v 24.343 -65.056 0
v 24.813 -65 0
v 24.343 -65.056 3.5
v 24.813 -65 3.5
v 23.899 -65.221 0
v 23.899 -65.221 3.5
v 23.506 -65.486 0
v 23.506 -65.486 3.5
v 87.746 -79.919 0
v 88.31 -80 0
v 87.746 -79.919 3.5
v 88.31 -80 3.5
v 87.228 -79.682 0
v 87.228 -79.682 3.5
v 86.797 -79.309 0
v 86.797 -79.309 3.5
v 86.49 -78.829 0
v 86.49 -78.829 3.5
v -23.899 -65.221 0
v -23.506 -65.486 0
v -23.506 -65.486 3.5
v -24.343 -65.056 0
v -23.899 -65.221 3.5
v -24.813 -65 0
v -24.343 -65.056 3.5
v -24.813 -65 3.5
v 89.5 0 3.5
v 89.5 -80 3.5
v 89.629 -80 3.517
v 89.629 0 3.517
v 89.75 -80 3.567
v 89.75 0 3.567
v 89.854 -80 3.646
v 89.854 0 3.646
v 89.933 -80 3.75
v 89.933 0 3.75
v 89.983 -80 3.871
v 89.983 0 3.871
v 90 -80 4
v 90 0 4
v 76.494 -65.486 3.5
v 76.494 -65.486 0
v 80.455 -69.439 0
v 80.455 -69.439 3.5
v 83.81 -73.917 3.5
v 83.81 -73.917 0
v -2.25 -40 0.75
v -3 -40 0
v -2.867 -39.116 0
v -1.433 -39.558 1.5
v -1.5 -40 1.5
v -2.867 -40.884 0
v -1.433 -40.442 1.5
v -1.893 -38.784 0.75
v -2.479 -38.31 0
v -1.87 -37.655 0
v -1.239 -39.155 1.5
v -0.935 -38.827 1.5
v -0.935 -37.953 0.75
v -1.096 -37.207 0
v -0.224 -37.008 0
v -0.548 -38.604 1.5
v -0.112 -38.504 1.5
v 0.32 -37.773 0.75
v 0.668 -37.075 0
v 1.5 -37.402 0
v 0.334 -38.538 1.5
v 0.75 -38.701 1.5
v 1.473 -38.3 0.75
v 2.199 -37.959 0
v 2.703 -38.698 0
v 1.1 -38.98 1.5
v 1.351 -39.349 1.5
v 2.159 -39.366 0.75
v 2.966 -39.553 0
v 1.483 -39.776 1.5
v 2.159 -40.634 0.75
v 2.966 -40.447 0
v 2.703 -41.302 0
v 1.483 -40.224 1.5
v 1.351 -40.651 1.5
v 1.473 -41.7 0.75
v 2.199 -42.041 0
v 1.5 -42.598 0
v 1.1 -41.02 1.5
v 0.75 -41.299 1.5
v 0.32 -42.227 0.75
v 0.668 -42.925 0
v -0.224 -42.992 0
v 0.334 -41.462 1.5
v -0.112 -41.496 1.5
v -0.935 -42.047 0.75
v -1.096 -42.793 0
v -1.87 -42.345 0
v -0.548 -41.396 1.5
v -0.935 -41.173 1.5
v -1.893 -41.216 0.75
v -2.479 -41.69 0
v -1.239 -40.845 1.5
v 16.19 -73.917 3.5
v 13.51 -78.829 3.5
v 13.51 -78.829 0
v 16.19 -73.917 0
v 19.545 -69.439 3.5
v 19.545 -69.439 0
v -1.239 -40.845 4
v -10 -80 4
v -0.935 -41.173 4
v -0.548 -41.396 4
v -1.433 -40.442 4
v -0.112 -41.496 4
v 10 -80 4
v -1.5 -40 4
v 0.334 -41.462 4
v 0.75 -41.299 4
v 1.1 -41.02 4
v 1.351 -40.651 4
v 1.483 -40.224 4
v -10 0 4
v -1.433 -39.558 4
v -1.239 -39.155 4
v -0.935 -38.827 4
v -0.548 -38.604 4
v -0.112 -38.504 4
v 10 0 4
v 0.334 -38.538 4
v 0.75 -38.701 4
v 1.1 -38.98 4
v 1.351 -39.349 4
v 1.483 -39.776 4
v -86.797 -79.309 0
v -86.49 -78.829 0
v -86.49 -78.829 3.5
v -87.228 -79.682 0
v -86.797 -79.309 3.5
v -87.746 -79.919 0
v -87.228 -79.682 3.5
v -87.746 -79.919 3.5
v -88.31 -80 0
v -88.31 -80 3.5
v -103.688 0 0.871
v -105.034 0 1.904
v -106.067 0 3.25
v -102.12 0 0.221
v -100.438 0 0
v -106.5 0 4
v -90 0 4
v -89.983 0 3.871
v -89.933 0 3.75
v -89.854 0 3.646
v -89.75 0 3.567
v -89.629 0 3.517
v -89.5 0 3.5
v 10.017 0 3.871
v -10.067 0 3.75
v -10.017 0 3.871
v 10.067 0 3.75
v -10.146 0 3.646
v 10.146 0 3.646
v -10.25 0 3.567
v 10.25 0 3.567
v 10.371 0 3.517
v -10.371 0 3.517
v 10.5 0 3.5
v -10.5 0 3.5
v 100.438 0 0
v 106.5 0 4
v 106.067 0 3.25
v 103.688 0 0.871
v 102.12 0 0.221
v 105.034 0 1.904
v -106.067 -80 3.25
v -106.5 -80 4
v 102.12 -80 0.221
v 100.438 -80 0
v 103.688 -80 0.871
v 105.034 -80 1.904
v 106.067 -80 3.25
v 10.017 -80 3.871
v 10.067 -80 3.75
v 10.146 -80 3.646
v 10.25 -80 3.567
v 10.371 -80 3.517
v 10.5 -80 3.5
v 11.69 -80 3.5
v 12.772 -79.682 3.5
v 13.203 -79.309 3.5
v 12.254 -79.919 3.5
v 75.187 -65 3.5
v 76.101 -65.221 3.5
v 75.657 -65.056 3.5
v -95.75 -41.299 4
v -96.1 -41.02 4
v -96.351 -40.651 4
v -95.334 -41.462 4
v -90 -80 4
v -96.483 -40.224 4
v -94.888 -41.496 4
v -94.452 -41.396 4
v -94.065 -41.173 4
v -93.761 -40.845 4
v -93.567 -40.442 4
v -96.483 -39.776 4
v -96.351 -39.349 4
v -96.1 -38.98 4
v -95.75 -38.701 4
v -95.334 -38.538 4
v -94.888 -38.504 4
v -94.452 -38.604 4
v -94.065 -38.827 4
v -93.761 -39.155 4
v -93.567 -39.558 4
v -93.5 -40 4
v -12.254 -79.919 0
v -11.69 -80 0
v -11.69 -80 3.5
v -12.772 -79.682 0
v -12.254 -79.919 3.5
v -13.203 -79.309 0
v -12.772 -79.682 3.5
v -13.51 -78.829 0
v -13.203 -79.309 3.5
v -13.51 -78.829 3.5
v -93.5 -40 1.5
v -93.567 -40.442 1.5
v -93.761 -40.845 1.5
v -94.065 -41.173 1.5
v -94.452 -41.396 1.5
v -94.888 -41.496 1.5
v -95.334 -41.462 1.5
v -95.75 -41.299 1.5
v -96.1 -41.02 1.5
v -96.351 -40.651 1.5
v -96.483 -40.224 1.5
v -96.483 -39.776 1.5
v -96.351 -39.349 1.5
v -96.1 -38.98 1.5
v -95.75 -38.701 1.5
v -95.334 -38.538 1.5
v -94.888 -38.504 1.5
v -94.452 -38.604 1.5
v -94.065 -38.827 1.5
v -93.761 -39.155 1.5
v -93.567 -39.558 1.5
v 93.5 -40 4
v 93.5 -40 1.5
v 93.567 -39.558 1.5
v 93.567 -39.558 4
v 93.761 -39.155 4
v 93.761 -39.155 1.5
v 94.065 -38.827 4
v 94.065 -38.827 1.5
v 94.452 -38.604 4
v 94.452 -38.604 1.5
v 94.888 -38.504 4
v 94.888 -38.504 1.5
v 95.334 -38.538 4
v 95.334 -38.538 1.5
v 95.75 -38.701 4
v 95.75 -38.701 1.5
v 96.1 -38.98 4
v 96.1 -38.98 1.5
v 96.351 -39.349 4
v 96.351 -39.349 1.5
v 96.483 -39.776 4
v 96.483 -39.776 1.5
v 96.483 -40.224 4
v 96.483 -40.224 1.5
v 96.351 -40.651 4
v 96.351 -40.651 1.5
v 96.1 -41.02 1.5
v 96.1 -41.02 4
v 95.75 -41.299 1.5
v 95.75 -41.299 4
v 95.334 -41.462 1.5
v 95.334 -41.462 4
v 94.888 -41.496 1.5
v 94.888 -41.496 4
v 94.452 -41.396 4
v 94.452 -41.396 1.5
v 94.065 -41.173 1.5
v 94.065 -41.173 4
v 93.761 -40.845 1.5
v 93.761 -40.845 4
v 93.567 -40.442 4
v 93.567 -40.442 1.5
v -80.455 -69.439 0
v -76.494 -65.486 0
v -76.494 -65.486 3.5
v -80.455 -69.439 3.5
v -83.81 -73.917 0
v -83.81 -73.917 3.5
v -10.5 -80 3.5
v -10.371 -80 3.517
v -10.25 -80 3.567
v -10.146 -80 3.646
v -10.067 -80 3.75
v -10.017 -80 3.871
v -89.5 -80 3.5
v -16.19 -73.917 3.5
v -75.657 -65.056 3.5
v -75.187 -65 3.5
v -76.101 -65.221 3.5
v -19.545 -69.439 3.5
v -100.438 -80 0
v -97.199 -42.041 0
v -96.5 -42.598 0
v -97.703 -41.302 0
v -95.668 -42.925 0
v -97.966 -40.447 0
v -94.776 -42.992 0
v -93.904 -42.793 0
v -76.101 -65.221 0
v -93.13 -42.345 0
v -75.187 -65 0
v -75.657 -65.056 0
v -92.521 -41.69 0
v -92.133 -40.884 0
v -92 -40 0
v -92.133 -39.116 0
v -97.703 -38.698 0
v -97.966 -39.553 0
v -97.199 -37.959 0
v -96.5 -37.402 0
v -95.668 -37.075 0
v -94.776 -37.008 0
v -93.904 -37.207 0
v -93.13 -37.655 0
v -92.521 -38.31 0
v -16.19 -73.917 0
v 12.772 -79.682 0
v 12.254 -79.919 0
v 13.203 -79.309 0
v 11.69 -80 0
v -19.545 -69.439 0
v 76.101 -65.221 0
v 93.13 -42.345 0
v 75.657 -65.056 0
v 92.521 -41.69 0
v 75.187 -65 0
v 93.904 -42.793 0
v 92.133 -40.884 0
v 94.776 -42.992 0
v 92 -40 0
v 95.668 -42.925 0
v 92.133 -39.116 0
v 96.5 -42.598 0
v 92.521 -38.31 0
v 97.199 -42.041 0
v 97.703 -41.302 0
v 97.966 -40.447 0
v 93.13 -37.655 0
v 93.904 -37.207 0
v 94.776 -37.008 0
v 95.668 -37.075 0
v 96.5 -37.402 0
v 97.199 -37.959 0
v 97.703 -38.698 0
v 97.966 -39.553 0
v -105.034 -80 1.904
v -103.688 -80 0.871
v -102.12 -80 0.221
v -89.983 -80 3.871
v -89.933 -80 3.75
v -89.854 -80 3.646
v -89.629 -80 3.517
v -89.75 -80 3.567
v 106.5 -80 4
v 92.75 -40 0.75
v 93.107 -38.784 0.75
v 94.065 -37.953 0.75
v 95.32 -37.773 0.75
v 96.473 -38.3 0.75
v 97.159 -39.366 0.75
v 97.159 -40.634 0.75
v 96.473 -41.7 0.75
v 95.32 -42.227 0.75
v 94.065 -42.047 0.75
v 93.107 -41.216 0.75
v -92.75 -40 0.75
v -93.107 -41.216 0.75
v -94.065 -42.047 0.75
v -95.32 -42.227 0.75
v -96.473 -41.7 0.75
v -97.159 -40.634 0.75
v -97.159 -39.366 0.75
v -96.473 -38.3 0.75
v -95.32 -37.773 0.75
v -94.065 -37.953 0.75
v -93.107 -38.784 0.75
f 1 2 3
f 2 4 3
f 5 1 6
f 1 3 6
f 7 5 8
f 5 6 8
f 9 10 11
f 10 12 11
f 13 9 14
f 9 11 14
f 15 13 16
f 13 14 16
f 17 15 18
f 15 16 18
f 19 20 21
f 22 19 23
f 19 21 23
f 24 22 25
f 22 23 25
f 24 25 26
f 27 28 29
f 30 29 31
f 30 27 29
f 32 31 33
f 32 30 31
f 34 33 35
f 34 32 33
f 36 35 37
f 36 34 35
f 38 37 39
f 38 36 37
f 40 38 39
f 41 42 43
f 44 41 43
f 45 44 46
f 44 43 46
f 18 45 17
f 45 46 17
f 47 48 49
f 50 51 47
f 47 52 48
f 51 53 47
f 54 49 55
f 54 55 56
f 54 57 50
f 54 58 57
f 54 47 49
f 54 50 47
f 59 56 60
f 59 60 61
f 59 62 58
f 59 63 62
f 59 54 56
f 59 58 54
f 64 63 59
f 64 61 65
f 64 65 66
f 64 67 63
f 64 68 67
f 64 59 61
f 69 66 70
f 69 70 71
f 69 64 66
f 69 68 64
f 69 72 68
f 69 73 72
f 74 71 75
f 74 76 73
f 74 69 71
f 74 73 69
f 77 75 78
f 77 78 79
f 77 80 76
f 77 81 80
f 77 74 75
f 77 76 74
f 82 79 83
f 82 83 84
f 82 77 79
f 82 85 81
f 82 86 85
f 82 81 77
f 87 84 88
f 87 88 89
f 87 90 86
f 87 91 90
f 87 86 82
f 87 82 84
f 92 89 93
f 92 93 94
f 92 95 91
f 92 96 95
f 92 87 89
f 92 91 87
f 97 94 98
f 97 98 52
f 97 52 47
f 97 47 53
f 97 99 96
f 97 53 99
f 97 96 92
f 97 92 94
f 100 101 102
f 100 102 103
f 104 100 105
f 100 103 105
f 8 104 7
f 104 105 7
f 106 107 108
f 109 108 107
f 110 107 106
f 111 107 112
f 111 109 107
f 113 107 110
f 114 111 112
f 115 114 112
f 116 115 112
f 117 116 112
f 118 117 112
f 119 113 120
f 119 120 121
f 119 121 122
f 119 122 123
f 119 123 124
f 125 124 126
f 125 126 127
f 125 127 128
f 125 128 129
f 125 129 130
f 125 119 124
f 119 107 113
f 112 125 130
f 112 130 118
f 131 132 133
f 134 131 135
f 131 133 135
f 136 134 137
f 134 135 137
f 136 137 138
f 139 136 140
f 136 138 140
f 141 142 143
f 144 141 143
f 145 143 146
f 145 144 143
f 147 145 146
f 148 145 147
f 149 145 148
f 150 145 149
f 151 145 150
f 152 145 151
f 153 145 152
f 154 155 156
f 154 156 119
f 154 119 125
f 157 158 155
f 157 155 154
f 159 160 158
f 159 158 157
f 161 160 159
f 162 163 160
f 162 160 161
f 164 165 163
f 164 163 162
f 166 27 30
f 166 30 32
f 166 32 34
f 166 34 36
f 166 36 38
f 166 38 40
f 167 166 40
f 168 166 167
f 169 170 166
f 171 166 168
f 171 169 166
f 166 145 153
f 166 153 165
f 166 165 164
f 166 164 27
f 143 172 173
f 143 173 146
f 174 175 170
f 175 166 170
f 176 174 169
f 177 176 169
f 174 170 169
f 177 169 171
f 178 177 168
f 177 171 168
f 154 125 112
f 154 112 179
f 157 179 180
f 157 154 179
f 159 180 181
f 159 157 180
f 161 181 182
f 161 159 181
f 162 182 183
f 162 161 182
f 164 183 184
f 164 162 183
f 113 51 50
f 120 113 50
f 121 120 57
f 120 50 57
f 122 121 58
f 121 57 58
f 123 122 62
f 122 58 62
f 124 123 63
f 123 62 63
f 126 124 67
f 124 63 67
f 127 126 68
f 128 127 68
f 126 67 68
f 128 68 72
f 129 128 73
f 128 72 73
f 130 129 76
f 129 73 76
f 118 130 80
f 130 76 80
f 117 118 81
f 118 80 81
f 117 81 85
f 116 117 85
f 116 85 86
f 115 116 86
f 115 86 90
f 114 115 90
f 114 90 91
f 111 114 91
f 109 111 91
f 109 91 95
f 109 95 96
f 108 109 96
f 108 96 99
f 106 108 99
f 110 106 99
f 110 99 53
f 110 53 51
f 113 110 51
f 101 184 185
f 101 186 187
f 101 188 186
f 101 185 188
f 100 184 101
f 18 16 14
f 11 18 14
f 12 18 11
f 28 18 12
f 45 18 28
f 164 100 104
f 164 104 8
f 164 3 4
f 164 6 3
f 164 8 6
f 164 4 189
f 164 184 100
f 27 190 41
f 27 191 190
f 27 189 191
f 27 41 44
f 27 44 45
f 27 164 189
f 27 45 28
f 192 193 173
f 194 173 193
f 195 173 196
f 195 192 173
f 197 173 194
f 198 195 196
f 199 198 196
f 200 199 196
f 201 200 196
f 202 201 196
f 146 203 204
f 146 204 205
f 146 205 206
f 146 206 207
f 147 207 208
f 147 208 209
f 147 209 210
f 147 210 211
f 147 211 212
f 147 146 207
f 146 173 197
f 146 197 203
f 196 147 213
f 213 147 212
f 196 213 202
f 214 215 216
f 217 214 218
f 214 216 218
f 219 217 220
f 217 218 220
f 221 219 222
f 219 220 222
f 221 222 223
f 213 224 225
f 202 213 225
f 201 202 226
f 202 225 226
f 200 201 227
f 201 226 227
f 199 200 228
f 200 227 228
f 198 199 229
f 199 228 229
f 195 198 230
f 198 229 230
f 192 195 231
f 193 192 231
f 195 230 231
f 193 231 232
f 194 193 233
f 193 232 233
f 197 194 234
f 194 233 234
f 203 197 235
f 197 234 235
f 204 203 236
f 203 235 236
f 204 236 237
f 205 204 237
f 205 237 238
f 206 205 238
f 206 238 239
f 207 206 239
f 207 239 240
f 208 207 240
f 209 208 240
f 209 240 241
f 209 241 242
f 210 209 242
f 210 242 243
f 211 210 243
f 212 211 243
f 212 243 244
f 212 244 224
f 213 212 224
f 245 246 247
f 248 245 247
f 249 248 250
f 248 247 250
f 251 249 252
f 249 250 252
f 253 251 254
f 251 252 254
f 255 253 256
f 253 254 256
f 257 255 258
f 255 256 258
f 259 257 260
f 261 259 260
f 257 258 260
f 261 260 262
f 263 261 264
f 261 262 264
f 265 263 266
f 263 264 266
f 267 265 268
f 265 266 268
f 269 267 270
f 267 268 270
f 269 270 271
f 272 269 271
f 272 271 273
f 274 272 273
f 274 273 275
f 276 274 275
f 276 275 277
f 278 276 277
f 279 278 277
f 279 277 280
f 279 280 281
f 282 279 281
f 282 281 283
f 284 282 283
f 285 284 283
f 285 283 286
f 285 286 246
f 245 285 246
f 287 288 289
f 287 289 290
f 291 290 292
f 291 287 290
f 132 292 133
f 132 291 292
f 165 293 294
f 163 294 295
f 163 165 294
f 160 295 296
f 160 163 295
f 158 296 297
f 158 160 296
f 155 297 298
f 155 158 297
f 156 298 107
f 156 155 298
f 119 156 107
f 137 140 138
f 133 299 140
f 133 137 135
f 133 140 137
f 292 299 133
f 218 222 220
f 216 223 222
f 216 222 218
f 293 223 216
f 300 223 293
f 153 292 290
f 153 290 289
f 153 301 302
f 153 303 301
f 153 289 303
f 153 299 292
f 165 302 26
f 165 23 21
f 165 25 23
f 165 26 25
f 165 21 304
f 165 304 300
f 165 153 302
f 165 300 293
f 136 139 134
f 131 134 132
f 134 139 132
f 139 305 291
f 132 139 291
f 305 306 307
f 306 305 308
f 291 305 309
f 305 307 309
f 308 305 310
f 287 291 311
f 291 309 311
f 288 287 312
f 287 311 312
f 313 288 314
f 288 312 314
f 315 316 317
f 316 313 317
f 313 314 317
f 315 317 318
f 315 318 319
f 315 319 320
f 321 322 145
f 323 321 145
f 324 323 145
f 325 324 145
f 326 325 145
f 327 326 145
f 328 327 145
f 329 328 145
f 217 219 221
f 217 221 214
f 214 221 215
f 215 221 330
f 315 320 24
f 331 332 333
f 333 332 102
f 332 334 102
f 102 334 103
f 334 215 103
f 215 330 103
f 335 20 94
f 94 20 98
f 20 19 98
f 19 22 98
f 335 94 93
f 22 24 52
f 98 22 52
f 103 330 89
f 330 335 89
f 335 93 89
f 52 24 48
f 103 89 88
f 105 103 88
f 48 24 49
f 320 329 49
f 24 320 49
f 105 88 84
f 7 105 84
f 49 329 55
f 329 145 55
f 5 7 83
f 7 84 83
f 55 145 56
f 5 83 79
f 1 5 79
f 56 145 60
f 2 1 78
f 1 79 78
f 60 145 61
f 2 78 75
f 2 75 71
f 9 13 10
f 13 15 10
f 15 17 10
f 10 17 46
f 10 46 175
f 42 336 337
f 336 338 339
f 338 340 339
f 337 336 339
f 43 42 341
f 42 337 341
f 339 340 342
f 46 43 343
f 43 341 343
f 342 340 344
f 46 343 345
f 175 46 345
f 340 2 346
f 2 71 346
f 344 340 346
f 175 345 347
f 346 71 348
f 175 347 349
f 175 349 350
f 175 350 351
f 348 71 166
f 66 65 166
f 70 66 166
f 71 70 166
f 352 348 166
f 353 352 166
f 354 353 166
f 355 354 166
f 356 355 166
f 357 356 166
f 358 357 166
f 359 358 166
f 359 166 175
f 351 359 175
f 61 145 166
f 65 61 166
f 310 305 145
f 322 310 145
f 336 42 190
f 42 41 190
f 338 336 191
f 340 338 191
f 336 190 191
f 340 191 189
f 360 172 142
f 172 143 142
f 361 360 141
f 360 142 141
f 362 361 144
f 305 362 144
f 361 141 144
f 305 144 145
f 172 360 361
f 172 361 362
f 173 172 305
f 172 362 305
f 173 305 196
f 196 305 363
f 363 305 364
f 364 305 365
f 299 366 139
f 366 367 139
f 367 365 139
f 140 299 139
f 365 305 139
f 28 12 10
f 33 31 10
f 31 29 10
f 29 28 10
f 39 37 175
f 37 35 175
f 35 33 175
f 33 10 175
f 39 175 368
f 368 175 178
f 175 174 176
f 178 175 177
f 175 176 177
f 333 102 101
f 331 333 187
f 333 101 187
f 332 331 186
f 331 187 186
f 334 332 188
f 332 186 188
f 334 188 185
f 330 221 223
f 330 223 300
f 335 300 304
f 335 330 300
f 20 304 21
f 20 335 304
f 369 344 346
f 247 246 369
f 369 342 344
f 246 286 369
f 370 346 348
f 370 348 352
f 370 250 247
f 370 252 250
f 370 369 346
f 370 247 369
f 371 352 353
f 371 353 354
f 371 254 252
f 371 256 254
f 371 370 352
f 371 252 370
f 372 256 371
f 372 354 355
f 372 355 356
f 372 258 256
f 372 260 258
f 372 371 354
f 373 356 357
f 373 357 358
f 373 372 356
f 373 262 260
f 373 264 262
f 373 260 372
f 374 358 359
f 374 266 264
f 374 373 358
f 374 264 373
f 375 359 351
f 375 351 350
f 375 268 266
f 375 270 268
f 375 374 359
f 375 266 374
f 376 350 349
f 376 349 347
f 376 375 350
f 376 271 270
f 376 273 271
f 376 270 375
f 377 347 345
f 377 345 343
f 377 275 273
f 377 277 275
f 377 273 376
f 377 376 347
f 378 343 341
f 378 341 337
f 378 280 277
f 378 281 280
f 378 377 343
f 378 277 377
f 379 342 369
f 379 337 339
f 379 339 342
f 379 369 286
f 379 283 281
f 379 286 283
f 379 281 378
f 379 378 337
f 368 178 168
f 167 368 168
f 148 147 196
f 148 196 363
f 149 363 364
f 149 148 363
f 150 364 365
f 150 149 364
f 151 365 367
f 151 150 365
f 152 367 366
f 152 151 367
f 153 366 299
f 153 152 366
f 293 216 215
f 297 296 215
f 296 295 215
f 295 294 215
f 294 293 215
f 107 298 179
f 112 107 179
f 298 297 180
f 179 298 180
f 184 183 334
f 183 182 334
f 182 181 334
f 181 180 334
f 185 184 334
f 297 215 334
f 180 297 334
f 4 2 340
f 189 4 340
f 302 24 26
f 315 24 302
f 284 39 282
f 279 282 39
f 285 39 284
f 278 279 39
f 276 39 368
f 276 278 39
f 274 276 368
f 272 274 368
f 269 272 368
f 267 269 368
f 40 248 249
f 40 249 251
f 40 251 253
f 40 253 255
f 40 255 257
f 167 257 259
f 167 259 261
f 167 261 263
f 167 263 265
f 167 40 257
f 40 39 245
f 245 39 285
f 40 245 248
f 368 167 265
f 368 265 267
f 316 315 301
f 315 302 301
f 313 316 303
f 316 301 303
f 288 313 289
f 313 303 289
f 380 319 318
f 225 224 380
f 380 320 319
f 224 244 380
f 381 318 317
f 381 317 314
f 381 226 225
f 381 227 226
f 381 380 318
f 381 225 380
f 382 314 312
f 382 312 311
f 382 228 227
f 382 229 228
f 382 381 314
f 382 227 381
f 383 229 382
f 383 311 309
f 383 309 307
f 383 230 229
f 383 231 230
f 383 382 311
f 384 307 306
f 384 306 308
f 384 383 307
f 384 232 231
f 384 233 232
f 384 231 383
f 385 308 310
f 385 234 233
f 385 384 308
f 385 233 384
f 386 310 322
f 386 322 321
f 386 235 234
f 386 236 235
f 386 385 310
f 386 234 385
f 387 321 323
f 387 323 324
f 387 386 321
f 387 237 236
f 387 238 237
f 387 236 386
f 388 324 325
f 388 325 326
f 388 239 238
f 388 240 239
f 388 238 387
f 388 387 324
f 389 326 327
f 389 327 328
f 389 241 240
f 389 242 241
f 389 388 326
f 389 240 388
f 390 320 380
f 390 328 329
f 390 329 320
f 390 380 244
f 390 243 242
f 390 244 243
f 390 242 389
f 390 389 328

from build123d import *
from OCP.BRepFilletAPI import BRepFilletAPI_MakeChamfer

# Parameters (mm, degrees)
ESQUISSE1_W             = 213
ESQUISSE1_H             = 80
BOSS_EXTRU_1_DEPTH      = 4
CHANFREIN1_SIZE         = 4
CHANFREIN1_SIZE_2       = 2.309401077
CONG_1_R                = 6.5
ESQUISSE2_R             = 1.5
ENL_V_MAT_EXTRU_1_DEPTH = 134.260084046
ENL_V_MAT_EXTRU_2_DEPTH = 134.260084046
CHANFREIN2_SIZE         = 1.5
ENL_V_MAT_EXTRU_3_DEPTH = 134.260084046
CONG_2_R                = 2


with BuildPart() as part:
    # Esquisse1 → Boss.-Extru.1 (new body)
    with BuildSketch(Plane.XY):
        with Locations((0, -40)):
            Rectangle(ESQUISSE1_W, ESQUISSE1_H)
    extrude(amount=BOSS_EXTRU_1_DEPTH)

    # Chanfrein1
    chanfrein1_edges_1 = [part.edges().sort_by_distance(p)[0] for p in [
        (-106.5, -40, 0),
    ]]
    chanfrein1_side_1 = [part.faces().sort_by_distance(p)[0] for p in [
        (-106.5, -40, 0.046188022),
    ]]
    chanfrein1_edges_2 = [part.edges().sort_by_distance(p)[0] for p in [
        (106.5, -40, 0),
    ]]
    chanfrein1_side_2 = [part.faces().sort_by_distance(p)[0] for p in [
        (106.5, -40, 0.046188022),
    ]]
    chanfrein1 = BRepFilletAPI_MakeChamfer(part.part.solid().wrapped)
    for e in chanfrein1_edges_1:
        chanfrein1.Add(CHANFREIN1_SIZE - 0.0001, CHANFREIN1_SIZE_2 - 0.0001, e.wrapped, chanfrein1_side_1[0].wrapped)
    for e in chanfrein1_edges_2:
        chanfrein1.Add(CHANFREIN1_SIZE - 0.0001, CHANFREIN1_SIZE_2 - 0.0001, e.wrapped, chanfrein1_side_2[0].wrapped)
    add(Compound.cast(chanfrein1.Shape()), mode=Mode.REPLACE)  # a hair under: the kernel refuses the full size

    # Congé1
    cong_1_edges = [part.edges().sort_by_distance(p)[0] for p in [
        (104.190698923, -40, 0),
        (-104.190698923, -40, 0),
    ]]
    fillet(cong_1_edges, radius=CONG_1_R)

    # Esquisse2 → Enlèv. mat.-Extru.1 (cut, through all)
    with BuildSketch(Plane(origin=(0, 0, 0), x_dir=(-1, 0, 0), z_dir=(0, 0, -1))):
        with Locations((-95, -40)):
            Circle(ESQUISSE2_R)
        with Locations(Location((95, -40, 0), (0, 0, 180))):
            Circle(ESQUISSE2_R)
        with Locations((0, -40)):
            Circle(ESQUISSE2_R)
    extrude(amount=-ENL_V_MAT_EXTRU_1_DEPTH, mode=Mode.SUBTRACT)

    # Esquisse3 → Enlèv. mat.-Extru.2 (cut, through all)
    with BuildSketch(Plane(origin=(0, 0, 0), x_dir=(1, 0, 0), z_dir=(0, 1, 0))):
        with BuildLine():
            Line((-89.5, -3.5), (-10.5, -3.5))
            ThreePointArc((-10.5, -3.5), (-10, -4), (-10.5, -4.5))
            Line((-10.5, -4.5), (-89.5, -4.5))
            ThreePointArc((-89.5, -4.5), (-90, -4), (-89.5, -3.5))
        make_face()
        with BuildLine():
            Line((10.5, -3.5), (89.5, -3.5))
            ThreePointArc((89.5, -3.5), (90, -4), (89.5, -4.5))
            Line((89.5, -4.5), (10.5, -4.5))
            ThreePointArc((10.5, -4.5), (10, -4), (10.5, -3.5))
        make_face()
    extrude(amount=-ENL_V_MAT_EXTRU_2_DEPTH, mode=Mode.SUBTRACT)

    # Chanfrein2
    chanfrein2_edges = [part.edges().sort_by_distance(p)[0] for p in [
        (96.5, -40, 0),
        (-96.5, -40, 0),
        (1.5, -40, 0),
    ]]
    chamfer(chanfrein2_edges, length=CHANFREIN2_SIZE)

    # Esquisse4 → Enlèv. mat.-Extru.3 (cut, through all)
    with BuildSketch(Plane(origin=(0, 0, 0), x_dir=(-1, 0, 0), z_dir=(0, 0, -1))):
        with BuildLine():
            Line((-87, -80), (-13, -80))
            ThreePointArc((-13, -80), (-17.630306208, -71.827984304), (-24.080128411, -65))
            Line((-24.080128411, -65), (-75.919871589, -65))
            ThreePointArc((-75.919871589, -65), (-82.369693792, -71.827984304), (-87, -80))
        make_face()
        with BuildLine():
            Line((87, -80), (13, -80))
            ThreePointArc((13, -80), (17.630306208, -71.827984304), (24.080128411, -65))
            Line((24.080128411, -65), (75.919871589, -65))
            ThreePointArc((75.919871589, -65), (82.369693792, -71.827984304), (87, -80))
        make_face()
    extrude(amount=-ENL_V_MAT_EXTRU_3_DEPTH, mode=Mode.SUBTRACT)

    # Congé2
    cong_2_edges = [part.edges().sort_by_distance(p)[0] for p in [
        (87, -80, 1.75),
        (75.919871589, -65, 1.75),
        (24.080128411, -65, 1.75),
        (13, -80, 1.75),
        (-75.919871589, -65, 1.75),
        (-87, -80, 1.75),
        (-13, -80, 1.75),
        (-24.080128411, -65, 1.75),
    ]]
    fillet(cong_2_edges, radius=CONG_2_R)


solid = part.part
